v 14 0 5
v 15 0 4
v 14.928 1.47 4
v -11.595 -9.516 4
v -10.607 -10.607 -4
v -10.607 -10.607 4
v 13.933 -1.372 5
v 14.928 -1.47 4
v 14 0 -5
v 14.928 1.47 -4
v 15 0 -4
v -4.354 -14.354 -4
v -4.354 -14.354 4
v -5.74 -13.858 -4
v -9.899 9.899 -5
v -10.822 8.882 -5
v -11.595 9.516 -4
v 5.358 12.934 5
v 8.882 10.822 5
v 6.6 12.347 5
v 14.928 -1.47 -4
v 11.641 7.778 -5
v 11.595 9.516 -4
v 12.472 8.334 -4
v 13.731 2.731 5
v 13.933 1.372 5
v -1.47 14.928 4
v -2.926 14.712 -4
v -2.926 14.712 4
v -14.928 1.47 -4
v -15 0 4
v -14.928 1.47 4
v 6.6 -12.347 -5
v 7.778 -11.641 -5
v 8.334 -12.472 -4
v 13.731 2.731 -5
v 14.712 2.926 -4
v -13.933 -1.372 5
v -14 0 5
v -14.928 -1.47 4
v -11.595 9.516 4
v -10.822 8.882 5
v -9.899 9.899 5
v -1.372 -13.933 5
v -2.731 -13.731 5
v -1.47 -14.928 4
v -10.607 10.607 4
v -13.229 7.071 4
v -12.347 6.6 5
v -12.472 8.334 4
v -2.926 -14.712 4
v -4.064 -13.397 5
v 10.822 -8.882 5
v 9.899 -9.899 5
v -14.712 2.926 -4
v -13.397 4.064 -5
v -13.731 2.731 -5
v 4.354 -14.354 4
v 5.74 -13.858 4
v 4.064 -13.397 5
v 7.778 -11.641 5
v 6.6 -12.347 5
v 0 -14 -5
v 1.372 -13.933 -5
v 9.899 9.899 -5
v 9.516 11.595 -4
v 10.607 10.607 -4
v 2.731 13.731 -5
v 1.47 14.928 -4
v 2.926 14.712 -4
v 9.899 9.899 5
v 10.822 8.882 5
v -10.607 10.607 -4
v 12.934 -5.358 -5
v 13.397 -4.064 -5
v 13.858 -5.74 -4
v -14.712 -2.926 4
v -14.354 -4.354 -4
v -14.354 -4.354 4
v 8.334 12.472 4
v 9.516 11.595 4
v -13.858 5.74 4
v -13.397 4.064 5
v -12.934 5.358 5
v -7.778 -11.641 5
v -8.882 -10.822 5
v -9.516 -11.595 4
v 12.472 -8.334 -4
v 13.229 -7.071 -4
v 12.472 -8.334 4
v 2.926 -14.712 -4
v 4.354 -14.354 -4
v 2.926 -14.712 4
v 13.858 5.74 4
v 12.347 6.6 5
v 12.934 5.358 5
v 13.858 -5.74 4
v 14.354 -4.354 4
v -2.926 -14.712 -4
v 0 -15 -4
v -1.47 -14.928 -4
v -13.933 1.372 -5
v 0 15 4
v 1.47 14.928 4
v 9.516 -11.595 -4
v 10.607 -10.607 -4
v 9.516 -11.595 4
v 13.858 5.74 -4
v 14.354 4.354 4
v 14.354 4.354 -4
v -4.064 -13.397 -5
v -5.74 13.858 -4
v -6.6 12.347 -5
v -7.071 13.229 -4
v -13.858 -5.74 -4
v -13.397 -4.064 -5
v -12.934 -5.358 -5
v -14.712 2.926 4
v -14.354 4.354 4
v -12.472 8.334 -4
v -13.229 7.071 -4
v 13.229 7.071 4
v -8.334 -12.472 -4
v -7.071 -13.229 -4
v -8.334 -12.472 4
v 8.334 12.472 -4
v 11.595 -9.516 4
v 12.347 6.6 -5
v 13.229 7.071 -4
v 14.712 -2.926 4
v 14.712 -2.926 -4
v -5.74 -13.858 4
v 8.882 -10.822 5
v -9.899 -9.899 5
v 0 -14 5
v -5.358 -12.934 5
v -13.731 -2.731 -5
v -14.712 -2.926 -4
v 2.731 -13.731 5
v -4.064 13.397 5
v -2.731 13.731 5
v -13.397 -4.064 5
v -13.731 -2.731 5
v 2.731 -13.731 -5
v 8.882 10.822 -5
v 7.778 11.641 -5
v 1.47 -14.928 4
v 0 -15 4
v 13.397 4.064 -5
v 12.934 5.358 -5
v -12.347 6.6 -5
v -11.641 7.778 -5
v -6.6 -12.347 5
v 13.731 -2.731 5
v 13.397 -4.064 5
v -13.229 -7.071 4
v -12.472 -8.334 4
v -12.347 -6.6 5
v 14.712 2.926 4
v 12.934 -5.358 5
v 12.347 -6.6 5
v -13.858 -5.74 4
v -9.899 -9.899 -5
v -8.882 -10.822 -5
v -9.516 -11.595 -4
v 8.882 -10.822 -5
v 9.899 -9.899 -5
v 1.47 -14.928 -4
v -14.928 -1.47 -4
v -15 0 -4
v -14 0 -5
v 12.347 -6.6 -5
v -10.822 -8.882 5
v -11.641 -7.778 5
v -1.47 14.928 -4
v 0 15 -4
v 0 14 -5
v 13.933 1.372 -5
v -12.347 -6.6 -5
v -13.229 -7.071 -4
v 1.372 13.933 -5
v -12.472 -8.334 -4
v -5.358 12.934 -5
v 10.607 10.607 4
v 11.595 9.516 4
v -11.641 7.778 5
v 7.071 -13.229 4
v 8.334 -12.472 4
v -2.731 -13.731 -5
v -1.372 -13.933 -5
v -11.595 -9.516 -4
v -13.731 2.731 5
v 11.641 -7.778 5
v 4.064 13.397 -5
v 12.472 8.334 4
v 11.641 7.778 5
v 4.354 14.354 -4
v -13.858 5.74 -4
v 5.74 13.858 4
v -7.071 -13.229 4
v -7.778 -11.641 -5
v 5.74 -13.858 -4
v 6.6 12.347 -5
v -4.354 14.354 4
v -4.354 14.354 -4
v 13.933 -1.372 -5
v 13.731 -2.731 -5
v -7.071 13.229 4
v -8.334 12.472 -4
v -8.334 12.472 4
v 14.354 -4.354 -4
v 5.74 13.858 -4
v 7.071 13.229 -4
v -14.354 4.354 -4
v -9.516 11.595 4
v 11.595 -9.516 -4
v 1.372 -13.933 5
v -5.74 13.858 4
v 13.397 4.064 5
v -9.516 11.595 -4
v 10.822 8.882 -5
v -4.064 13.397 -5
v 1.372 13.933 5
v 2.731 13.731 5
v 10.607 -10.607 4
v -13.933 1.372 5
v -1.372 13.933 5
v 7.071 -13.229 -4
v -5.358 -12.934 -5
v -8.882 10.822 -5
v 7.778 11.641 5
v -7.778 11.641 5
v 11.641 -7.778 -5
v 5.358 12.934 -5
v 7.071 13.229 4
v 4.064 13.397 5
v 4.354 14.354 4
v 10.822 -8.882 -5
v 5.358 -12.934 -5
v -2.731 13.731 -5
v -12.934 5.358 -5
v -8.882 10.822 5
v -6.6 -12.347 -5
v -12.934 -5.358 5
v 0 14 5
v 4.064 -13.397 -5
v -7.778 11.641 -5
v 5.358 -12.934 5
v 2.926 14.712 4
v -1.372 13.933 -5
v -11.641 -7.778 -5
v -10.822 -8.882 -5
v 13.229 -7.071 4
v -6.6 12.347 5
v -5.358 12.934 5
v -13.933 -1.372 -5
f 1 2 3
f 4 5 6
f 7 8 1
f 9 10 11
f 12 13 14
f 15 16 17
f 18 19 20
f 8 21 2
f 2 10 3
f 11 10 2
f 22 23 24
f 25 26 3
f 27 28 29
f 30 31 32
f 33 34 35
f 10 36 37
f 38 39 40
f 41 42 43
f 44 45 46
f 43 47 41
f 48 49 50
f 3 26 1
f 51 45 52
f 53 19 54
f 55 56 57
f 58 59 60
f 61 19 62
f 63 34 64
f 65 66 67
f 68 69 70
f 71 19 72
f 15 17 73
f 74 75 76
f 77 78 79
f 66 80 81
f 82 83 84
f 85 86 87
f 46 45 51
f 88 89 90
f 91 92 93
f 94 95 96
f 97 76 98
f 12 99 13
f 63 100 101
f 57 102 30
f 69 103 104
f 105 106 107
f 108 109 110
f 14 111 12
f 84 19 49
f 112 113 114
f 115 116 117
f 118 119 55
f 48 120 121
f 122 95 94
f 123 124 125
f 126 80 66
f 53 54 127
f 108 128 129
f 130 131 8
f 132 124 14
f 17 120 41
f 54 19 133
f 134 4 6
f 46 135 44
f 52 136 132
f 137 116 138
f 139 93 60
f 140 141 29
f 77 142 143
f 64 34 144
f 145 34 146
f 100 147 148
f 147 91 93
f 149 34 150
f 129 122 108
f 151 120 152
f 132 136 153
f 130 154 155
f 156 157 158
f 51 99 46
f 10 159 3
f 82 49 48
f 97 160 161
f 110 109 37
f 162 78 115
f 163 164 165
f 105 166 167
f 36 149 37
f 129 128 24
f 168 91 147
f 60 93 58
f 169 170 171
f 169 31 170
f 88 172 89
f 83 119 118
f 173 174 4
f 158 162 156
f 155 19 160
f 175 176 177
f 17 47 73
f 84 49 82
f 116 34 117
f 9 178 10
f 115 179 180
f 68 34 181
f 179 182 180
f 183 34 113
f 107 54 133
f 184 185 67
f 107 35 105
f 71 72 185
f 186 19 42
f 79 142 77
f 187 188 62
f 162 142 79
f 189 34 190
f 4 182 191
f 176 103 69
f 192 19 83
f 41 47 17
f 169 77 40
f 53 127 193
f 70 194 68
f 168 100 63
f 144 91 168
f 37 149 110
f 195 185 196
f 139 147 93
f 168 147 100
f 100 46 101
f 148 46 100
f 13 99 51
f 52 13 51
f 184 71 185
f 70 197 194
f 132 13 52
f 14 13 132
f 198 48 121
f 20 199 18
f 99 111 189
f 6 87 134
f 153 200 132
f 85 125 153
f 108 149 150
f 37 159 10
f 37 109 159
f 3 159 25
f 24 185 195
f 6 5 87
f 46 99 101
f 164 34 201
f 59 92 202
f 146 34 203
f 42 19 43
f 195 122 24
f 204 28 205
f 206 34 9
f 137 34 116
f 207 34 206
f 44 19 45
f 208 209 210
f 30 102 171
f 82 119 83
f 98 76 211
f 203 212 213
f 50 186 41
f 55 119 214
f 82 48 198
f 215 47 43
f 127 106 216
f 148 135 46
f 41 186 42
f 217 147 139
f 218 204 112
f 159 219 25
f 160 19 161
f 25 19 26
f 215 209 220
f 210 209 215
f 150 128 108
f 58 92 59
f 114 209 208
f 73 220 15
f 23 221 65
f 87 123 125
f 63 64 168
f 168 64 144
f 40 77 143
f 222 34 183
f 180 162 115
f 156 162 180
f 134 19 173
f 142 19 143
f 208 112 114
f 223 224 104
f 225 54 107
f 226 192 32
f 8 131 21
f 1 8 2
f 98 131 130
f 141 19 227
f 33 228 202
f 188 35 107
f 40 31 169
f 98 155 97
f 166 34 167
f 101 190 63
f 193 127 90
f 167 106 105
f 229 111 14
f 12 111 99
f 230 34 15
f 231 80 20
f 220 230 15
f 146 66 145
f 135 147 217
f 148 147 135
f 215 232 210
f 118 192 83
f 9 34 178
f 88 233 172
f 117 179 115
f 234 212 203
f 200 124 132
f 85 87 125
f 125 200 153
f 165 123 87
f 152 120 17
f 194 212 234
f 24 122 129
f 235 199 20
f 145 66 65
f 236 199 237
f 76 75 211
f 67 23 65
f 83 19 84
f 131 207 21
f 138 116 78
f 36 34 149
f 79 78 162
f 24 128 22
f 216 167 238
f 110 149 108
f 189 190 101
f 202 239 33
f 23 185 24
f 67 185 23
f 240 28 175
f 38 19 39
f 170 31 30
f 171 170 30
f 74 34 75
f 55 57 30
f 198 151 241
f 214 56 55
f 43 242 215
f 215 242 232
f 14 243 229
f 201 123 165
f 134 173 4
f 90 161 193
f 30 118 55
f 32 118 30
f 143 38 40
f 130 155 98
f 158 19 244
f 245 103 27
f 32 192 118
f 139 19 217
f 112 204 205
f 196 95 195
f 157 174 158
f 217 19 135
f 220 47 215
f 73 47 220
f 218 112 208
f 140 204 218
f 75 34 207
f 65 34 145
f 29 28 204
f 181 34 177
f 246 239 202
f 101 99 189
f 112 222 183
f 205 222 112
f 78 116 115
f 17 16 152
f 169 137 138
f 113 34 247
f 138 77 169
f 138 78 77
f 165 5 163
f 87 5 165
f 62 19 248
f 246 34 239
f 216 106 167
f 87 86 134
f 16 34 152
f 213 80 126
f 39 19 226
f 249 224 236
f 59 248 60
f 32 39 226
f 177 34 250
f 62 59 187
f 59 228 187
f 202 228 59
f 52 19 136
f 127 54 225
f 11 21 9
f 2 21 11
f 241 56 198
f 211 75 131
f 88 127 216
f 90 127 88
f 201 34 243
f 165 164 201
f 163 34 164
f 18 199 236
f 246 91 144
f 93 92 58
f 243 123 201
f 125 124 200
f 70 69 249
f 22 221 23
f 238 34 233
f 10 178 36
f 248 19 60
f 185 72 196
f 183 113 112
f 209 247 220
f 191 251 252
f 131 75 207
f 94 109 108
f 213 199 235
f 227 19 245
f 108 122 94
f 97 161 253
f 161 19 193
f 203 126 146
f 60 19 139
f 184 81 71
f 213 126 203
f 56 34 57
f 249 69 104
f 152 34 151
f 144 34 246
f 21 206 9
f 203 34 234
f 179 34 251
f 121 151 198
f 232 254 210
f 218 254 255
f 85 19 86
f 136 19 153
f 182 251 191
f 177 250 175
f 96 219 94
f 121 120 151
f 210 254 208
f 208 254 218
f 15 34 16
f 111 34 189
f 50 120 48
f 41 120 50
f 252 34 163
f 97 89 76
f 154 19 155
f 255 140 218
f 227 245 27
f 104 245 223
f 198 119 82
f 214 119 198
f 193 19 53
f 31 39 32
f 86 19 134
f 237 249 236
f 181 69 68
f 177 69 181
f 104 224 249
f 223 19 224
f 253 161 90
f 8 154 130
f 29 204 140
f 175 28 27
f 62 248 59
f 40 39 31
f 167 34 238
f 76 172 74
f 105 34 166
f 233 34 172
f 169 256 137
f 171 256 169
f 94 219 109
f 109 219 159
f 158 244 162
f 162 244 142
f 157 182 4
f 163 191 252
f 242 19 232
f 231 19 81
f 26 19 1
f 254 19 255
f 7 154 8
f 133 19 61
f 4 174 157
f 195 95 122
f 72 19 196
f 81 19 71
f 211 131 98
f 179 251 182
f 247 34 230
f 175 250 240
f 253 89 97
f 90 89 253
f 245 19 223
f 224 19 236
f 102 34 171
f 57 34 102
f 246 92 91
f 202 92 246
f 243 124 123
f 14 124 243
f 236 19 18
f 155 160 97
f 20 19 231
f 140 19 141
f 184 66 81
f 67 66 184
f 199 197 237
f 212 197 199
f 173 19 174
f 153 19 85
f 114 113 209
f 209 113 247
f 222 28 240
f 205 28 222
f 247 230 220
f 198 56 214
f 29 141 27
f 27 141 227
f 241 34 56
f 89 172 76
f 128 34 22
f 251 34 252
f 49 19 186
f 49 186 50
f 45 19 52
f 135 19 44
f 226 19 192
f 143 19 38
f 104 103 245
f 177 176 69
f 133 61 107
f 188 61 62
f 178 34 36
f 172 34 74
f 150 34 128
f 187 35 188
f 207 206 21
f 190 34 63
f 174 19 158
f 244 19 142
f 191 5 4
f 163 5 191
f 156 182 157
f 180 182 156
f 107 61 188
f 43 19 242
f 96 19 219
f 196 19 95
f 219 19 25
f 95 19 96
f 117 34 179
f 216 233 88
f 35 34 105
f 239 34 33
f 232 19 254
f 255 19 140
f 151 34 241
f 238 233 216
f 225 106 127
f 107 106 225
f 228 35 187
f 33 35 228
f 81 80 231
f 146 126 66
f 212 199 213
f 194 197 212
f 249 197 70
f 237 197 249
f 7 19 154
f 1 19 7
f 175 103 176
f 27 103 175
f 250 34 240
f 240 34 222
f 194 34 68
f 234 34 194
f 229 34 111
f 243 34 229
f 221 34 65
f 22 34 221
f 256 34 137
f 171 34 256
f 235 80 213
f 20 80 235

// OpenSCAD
$fn = 64;

module chamfered_cylinder(
    d = 30,
    h = 10,
    chamfer = 1){
        
    hull(){
        translate([0,0,h/2-chamfer/2])
            cylinder(h=chamfer, d1=d, d2=d-2*chamfer, center = true);
        translate([0,0,-h/2+chamfer/2])
            cylinder(h=chamfer, d1=d-2*chamfer, d2=d, center= true);
    }
}

chamfered_cylinder();
